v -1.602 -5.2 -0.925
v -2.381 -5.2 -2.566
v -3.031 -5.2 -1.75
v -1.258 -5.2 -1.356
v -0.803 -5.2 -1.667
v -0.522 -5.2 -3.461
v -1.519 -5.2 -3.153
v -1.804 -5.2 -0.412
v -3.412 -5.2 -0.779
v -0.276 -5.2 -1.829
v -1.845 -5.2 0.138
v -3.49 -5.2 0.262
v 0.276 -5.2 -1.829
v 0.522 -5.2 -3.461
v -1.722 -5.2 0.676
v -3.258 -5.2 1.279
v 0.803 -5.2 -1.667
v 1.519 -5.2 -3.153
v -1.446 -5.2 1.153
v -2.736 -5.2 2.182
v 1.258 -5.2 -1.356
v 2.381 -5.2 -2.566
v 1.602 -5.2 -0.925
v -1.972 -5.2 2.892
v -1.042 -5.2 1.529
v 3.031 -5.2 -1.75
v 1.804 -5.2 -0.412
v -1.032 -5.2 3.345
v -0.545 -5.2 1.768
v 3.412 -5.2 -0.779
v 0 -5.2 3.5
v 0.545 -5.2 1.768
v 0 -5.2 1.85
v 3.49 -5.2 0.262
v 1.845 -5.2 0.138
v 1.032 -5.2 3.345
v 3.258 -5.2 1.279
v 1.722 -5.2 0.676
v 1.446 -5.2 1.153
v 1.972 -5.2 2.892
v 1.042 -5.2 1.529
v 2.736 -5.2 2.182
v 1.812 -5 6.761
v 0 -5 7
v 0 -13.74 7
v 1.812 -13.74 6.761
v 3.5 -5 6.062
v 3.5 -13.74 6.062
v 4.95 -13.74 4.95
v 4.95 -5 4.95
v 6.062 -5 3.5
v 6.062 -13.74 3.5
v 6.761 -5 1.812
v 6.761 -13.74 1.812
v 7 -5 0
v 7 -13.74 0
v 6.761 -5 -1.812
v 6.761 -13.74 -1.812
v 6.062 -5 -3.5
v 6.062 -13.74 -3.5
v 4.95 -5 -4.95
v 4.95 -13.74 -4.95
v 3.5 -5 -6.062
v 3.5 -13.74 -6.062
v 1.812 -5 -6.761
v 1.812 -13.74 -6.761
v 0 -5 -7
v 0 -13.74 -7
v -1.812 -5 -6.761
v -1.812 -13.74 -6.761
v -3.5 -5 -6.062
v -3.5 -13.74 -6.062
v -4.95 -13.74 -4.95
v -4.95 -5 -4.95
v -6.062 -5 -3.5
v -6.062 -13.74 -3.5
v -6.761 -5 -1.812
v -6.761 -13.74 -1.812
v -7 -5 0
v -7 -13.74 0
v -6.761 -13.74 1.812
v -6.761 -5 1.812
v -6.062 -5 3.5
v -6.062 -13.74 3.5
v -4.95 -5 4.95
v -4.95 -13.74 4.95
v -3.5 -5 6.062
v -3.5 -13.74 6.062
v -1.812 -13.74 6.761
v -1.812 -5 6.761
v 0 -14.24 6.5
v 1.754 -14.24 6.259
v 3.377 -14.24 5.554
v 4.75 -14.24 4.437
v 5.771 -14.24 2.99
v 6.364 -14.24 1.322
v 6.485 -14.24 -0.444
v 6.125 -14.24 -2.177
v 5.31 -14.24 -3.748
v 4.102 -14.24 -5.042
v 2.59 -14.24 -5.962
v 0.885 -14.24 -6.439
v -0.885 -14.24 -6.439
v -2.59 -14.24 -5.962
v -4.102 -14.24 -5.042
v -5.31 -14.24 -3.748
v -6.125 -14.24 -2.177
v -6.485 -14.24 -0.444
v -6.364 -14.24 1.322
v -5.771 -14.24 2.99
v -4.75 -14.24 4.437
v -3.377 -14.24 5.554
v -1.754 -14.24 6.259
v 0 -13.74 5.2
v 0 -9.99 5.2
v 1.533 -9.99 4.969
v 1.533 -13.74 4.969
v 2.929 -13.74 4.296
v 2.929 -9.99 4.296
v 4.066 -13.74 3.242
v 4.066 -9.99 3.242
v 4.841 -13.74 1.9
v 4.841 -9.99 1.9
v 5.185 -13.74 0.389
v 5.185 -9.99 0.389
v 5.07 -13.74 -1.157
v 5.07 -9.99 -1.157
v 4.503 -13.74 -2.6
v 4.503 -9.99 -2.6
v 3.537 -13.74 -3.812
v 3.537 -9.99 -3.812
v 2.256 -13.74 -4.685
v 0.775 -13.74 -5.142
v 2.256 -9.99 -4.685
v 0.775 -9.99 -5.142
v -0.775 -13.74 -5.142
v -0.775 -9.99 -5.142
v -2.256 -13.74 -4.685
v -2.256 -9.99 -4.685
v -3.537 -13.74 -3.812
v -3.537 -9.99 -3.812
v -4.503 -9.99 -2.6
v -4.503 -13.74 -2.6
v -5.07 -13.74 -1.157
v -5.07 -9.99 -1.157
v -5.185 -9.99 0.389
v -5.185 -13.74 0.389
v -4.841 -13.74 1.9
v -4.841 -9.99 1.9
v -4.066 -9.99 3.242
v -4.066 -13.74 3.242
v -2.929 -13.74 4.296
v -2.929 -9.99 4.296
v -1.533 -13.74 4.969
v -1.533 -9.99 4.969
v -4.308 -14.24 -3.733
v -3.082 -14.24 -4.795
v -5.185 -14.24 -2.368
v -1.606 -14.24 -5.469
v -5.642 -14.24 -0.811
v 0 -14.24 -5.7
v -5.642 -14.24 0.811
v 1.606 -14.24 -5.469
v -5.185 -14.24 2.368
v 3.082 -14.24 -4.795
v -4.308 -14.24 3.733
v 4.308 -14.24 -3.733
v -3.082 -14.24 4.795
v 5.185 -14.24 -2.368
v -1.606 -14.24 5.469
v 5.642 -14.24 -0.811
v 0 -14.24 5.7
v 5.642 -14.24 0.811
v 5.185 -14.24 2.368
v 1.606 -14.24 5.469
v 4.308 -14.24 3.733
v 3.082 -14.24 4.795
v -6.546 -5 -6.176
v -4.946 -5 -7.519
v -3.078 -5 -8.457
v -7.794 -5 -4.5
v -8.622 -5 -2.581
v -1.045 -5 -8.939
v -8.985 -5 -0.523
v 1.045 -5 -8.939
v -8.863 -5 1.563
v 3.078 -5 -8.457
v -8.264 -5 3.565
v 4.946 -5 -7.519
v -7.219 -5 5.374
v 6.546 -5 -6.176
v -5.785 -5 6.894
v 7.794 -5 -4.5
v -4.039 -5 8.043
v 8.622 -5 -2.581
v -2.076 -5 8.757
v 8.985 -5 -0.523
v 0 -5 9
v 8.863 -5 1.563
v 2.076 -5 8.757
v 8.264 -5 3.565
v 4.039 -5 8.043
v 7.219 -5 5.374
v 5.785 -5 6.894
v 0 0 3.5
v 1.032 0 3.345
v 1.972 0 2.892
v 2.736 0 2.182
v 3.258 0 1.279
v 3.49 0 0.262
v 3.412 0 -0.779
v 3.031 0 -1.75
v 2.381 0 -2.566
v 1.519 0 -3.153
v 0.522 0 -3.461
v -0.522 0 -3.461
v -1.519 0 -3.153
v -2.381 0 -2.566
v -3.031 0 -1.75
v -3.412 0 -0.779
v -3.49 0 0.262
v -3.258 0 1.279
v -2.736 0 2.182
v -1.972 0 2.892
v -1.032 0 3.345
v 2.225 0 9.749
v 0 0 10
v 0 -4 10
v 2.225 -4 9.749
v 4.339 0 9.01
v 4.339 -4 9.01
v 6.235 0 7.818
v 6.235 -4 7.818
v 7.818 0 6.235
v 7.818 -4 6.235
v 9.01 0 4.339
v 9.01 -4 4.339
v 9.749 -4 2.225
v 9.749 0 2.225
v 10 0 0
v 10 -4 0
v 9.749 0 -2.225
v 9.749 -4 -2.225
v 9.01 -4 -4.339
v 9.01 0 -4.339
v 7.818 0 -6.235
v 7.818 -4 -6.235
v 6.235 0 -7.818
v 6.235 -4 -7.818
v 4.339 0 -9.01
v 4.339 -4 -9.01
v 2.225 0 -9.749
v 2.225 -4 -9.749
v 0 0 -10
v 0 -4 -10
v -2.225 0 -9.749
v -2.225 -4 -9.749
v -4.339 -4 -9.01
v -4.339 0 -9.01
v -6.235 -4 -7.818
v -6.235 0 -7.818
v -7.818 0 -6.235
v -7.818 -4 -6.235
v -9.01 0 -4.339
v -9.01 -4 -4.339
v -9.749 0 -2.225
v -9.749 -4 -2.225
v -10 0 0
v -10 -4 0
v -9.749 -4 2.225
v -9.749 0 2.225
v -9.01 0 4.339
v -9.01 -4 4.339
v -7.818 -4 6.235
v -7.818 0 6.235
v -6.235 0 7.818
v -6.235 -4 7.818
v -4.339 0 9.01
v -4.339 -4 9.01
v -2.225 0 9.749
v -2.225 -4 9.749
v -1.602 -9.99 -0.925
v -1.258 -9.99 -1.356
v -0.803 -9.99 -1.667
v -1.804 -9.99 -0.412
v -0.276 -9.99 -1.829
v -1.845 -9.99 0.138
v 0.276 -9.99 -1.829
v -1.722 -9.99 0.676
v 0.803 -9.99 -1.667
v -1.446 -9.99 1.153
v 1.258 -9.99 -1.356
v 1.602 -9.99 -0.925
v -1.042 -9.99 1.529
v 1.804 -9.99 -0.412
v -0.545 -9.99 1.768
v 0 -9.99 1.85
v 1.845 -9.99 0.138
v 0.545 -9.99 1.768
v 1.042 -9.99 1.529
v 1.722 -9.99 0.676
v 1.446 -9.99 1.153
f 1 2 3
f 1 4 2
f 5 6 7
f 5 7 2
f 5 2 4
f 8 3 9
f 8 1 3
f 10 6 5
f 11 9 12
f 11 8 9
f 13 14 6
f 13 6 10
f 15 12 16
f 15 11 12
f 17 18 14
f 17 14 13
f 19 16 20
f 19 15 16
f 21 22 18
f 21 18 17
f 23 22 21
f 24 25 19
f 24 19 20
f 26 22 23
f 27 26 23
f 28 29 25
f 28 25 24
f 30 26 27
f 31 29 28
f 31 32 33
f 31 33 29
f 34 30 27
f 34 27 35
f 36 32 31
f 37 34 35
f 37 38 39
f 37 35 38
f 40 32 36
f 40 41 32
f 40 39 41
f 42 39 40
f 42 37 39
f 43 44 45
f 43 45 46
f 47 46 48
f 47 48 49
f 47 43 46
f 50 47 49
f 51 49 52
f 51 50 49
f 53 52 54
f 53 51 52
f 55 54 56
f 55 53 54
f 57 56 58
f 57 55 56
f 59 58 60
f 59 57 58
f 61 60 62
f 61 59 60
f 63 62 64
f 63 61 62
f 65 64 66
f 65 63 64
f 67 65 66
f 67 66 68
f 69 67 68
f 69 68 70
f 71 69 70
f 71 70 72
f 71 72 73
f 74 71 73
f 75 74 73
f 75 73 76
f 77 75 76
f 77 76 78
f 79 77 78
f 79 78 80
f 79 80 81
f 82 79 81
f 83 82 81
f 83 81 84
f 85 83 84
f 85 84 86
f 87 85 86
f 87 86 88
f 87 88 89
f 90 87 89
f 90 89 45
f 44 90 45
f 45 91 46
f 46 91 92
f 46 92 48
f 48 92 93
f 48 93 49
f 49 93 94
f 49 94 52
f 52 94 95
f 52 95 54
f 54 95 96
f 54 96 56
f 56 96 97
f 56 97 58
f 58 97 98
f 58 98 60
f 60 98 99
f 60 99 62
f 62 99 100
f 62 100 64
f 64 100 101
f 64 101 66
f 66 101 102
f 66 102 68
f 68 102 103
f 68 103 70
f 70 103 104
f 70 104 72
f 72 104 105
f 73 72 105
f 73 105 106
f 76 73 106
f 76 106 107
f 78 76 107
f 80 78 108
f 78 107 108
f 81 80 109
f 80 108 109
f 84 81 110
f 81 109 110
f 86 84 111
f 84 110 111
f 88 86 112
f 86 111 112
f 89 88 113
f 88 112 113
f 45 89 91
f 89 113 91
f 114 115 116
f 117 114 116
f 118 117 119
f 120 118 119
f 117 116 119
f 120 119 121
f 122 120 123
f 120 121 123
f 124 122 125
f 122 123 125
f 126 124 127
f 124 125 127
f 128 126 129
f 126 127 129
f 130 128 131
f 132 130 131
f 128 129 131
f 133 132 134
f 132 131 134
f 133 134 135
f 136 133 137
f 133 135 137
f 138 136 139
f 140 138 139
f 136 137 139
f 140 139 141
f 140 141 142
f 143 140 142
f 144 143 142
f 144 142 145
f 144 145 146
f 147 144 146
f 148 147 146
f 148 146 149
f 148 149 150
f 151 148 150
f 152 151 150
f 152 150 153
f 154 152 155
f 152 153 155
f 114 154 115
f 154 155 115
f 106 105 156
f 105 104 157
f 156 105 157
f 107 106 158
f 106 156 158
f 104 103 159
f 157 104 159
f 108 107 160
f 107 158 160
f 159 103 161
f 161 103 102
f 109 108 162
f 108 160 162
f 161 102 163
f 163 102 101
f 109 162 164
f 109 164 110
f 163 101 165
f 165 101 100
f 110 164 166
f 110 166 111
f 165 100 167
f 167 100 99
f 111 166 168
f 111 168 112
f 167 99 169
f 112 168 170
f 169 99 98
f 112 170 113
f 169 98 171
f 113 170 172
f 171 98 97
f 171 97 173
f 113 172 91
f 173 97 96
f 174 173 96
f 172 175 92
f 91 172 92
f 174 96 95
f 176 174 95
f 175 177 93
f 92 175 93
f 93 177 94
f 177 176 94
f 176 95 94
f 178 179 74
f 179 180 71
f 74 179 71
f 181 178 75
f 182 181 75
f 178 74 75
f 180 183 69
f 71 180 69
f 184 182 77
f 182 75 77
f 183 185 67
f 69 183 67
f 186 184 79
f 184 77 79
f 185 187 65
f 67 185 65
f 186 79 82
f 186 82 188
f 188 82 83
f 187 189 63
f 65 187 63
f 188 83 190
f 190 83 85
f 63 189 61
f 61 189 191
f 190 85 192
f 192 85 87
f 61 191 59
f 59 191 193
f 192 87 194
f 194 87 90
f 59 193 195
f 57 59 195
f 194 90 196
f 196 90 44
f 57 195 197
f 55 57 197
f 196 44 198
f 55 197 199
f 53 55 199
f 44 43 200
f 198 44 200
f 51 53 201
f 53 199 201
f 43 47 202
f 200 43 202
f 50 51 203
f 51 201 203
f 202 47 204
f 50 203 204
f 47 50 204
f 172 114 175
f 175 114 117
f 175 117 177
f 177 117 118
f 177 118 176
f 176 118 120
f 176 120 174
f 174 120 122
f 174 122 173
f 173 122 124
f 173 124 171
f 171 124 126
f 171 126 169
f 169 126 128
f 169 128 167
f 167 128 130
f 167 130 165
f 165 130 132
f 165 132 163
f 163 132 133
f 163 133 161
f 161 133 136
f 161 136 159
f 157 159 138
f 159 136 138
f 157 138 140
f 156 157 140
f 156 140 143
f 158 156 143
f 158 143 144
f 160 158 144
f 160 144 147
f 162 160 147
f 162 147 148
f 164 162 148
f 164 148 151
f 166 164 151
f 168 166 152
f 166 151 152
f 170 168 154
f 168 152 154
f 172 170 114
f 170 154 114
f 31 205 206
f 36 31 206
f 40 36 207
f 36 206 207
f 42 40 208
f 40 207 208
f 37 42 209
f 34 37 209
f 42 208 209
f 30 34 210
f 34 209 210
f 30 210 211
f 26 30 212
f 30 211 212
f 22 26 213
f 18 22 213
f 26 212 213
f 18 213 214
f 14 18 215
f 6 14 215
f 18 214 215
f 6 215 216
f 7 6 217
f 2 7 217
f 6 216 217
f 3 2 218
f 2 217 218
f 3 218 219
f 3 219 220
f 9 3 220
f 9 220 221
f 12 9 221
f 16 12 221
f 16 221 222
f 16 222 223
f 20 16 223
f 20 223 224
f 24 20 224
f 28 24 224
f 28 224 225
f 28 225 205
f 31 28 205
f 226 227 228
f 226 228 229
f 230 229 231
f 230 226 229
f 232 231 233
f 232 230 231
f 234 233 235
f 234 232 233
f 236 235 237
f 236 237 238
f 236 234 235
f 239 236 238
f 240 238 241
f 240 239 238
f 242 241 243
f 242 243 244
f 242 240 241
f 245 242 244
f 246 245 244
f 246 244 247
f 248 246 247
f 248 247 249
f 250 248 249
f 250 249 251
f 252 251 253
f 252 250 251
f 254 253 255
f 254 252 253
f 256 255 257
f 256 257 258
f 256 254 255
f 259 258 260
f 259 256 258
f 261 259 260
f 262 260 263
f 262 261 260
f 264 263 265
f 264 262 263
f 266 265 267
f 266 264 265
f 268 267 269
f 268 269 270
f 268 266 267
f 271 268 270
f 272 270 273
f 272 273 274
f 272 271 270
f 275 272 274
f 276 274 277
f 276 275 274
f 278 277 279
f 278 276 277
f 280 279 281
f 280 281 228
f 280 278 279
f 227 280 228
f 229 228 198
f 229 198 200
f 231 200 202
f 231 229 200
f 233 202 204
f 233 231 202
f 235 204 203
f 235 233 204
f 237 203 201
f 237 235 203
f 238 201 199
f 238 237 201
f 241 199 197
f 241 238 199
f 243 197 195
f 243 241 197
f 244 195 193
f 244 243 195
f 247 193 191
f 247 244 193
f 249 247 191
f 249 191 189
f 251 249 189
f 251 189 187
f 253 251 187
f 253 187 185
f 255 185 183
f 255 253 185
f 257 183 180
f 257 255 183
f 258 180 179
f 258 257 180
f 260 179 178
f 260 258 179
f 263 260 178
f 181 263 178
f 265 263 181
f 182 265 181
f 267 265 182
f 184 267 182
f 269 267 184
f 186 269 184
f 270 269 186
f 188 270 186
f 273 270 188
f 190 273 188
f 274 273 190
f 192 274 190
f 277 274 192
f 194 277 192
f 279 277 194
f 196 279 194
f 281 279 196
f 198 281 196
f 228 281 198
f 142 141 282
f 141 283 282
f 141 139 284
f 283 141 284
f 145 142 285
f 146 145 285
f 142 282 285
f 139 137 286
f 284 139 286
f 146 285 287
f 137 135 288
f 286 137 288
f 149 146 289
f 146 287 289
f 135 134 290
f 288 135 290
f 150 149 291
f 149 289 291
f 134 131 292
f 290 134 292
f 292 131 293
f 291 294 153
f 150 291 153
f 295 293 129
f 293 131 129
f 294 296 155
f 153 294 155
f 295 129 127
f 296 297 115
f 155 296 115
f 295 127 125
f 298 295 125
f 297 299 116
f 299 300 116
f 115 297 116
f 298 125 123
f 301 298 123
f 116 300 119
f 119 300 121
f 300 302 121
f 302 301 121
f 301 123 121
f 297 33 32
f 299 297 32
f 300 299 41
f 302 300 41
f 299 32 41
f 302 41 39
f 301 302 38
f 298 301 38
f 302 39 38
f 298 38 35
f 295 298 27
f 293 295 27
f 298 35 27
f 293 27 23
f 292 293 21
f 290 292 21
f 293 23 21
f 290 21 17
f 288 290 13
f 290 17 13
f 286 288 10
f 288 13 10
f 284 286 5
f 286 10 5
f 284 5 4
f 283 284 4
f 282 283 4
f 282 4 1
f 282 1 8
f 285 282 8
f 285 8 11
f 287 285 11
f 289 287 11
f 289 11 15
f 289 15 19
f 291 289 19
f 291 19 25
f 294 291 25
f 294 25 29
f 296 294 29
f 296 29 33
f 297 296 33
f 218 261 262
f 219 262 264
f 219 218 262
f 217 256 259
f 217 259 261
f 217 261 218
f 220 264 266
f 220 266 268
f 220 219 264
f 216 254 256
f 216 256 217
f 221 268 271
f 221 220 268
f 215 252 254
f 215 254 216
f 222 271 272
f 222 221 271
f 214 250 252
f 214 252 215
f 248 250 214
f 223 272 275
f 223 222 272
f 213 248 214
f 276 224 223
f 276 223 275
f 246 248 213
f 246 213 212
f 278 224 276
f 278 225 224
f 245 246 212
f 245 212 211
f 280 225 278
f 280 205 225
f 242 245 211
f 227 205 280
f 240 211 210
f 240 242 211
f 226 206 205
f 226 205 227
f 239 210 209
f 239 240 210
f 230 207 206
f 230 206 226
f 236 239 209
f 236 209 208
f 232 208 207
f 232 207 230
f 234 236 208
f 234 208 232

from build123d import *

# Parameters (mm, degrees)
SKETCH3_R           = 10
SKETCH3_R_2         = 7
BASE_DEPTH          = 5
SKETCH3_2_R         = 7
BOSS_EXTRUDE4_DEPTH = 14.24
SKETCH4_R           = 3.3
SKETCH4_R_2         = 1.65
CUT_EXTRUDE4_DEPTH  = 5
CUT_EXTRUDE5_START  = -9.99
SKETCH4_3_R         = 5
SKETCH4_3_R_2       = 3.3
SKETCH4_3_R_3       = 1.65
CUT_EXTRUDE5_DEPTH  = 4.25
SKETCH4_4_R         = 1.65
CUT_EXTRUDE6_DEPTH  = 21.069319869
F_2_MOVE_FACE1_BY   = 0.2
F_2_MOVE_FACE1_2_BY = 0.2
F_2_MOVE_FACE1_3_BY = 0.2
F_2_MOVE_FACE1_4_BY = 0.2
CHAMFER1_SIZE       = 0.5
CHAMFER2_SIZE       = 1


with BuildPart() as part:
    # Sketch3 → Base (new body)
    with BuildSketch(Plane(origin=(0, 0, 0), x_dir=(1, 0, 0), z_dir=(0, 1, 0))):
        with Locations(Location((0, 0, 0), (0, 0, 270))):
            Circle(SKETCH3_R)
        with Locations(Location((0, 0, 0), (0, 0, 270))):
            Circle(SKETCH3_R_2, mode=Mode.SUBTRACT)
    extrude(amount=-BASE_DEPTH)

    # Sketch3<2> → Boss-Extrude4 (add)
    with BuildSketch(Plane(origin=(0, 0, 0), x_dir=(1, 0, 0), z_dir=(0, 1, 0))):
        with Locations(Location((0, 0, 0), (0, 0, 270))):
            Circle(SKETCH3_2_R)
    extrude(amount=-BOSS_EXTRUDE4_DEPTH)

    # Sketch4 → Cut-Extrude4 (cut)
    with BuildSketch(Plane(origin=(0, 0, 0), x_dir=(1, 0, 0), z_dir=(0, 1, 0))):
        with Locations(Location((0, 0, 0), (0, 0, 270))):
            Circle(SKETCH4_R)
        with Locations(Location((0, 0, 0), (0, 0, 270))):
            Circle(SKETCH4_R_2, mode=Mode.SUBTRACT)
    extrude(amount=-CUT_EXTRUDE4_DEPTH, mode=Mode.SUBTRACT)

    # Sketch4<3> → Cut-Extrude5 (cut)
    # profile 1 of 3: a face of its own
    with BuildSketch(Plane(origin=(0, 0, 0), x_dir=(1, 0, 0), z_dir=(0, 1, 0)).offset(CUT_EXTRUDE5_START)):
        with Locations(Location((0, 0, 0), (0, 0, 270))):
            Circle(SKETCH4_3_R)
        with Locations(Location((0, 0, 0), (0, 0, 270))):
            Circle(SKETCH4_3_R_2, mode=Mode.SUBTRACT)
    # profile 2 of 3: a face of its own
    with BuildSketch(Plane(origin=(0, 0, 0), x_dir=(1, 0, 0), z_dir=(0, 1, 0)).offset(CUT_EXTRUDE5_START)):
        with Locations(Location((0, 0, 0), (0, 0, 270))):
            Circle(SKETCH4_3_R_2)
        with Locations(Location((0, 0, 0), (0, 0, 270))):
            Circle(SKETCH4_3_R_3, mode=Mode.SUBTRACT)
    # profile 3 of 3: a face of its own
    with BuildSketch(Plane(origin=(0, 0, 0), x_dir=(1, 0, 0), z_dir=(0, 1, 0)).offset(CUT_EXTRUDE5_START)):
        with Locations(Location((0, 0, 0), (0, 0, 270))):
            Circle(SKETCH4_3_R_3)
    extrude(amount=-CUT_EXTRUDE5_DEPTH, mode=Mode.SUBTRACT)

    # Sketch4<4> → Cut-Extrude6 (cut, through all)
    with BuildSketch(Plane(origin=(0, 0, 0), x_dir=(1, 0, 0), z_dir=(0, 1, 0))):
        with Locations(Location((0, 0, 0), (0, 0, 270))):
            Circle(SKETCH4_4_R)
    extrude(amount=-CUT_EXTRUDE6_DEPTH, mode=Mode.SUBTRACT)

    # .2 Move Face1: a curved face moved inward by 0.2
    add(Solid.thicken(part.faces().sort_by_distance((0, -12.115, -5))[0], -F_2_MOVE_FACE1_BY), mode=Mode.SUBTRACT)

    # 2 Move Face1 2: a curved face moved inward by 0.2
    add(Solid.thicken(part.faces().sort_by_distance((0, -7.495, -1.65))[0], -F_2_MOVE_FACE1_2_BY), mode=Mode.SUBTRACT)

    # 2 Move Face1 3: a face moved inward by 0.2
    extrude(part.faces().sort_by_distance((0, -5, 2.64))[0], amount=F_2_MOVE_FACE1_3_BY, dir=(0, -1, 0), mode=Mode.SUBTRACT)

    # 2 Move Face1 4: a curved face moved inward by 0.2
    add(Solid.thicken(part.faces().sort_by_distance((0, -2.5, -3.3))[0], -F_2_MOVE_FACE1_4_BY), mode=Mode.SUBTRACT)

    # Chamfer1
    chamfer1_edges = [part.edges().sort_by_distance(p)[0] for p in [
        (0, -14.24, -7),
        (0, -14.24, -5.2),
    ]]
    chamfer(chamfer1_edges, length=CHAMFER1_SIZE)

    # Chamfer2
    chamfer2_edges = [part.edges().sort_by_distance(p)[0] for p in [
        (0, -5, -10),
    ]]
    chamfer(chamfer2_edges, length=CHAMFER2_SIZE)


solid = part.part
